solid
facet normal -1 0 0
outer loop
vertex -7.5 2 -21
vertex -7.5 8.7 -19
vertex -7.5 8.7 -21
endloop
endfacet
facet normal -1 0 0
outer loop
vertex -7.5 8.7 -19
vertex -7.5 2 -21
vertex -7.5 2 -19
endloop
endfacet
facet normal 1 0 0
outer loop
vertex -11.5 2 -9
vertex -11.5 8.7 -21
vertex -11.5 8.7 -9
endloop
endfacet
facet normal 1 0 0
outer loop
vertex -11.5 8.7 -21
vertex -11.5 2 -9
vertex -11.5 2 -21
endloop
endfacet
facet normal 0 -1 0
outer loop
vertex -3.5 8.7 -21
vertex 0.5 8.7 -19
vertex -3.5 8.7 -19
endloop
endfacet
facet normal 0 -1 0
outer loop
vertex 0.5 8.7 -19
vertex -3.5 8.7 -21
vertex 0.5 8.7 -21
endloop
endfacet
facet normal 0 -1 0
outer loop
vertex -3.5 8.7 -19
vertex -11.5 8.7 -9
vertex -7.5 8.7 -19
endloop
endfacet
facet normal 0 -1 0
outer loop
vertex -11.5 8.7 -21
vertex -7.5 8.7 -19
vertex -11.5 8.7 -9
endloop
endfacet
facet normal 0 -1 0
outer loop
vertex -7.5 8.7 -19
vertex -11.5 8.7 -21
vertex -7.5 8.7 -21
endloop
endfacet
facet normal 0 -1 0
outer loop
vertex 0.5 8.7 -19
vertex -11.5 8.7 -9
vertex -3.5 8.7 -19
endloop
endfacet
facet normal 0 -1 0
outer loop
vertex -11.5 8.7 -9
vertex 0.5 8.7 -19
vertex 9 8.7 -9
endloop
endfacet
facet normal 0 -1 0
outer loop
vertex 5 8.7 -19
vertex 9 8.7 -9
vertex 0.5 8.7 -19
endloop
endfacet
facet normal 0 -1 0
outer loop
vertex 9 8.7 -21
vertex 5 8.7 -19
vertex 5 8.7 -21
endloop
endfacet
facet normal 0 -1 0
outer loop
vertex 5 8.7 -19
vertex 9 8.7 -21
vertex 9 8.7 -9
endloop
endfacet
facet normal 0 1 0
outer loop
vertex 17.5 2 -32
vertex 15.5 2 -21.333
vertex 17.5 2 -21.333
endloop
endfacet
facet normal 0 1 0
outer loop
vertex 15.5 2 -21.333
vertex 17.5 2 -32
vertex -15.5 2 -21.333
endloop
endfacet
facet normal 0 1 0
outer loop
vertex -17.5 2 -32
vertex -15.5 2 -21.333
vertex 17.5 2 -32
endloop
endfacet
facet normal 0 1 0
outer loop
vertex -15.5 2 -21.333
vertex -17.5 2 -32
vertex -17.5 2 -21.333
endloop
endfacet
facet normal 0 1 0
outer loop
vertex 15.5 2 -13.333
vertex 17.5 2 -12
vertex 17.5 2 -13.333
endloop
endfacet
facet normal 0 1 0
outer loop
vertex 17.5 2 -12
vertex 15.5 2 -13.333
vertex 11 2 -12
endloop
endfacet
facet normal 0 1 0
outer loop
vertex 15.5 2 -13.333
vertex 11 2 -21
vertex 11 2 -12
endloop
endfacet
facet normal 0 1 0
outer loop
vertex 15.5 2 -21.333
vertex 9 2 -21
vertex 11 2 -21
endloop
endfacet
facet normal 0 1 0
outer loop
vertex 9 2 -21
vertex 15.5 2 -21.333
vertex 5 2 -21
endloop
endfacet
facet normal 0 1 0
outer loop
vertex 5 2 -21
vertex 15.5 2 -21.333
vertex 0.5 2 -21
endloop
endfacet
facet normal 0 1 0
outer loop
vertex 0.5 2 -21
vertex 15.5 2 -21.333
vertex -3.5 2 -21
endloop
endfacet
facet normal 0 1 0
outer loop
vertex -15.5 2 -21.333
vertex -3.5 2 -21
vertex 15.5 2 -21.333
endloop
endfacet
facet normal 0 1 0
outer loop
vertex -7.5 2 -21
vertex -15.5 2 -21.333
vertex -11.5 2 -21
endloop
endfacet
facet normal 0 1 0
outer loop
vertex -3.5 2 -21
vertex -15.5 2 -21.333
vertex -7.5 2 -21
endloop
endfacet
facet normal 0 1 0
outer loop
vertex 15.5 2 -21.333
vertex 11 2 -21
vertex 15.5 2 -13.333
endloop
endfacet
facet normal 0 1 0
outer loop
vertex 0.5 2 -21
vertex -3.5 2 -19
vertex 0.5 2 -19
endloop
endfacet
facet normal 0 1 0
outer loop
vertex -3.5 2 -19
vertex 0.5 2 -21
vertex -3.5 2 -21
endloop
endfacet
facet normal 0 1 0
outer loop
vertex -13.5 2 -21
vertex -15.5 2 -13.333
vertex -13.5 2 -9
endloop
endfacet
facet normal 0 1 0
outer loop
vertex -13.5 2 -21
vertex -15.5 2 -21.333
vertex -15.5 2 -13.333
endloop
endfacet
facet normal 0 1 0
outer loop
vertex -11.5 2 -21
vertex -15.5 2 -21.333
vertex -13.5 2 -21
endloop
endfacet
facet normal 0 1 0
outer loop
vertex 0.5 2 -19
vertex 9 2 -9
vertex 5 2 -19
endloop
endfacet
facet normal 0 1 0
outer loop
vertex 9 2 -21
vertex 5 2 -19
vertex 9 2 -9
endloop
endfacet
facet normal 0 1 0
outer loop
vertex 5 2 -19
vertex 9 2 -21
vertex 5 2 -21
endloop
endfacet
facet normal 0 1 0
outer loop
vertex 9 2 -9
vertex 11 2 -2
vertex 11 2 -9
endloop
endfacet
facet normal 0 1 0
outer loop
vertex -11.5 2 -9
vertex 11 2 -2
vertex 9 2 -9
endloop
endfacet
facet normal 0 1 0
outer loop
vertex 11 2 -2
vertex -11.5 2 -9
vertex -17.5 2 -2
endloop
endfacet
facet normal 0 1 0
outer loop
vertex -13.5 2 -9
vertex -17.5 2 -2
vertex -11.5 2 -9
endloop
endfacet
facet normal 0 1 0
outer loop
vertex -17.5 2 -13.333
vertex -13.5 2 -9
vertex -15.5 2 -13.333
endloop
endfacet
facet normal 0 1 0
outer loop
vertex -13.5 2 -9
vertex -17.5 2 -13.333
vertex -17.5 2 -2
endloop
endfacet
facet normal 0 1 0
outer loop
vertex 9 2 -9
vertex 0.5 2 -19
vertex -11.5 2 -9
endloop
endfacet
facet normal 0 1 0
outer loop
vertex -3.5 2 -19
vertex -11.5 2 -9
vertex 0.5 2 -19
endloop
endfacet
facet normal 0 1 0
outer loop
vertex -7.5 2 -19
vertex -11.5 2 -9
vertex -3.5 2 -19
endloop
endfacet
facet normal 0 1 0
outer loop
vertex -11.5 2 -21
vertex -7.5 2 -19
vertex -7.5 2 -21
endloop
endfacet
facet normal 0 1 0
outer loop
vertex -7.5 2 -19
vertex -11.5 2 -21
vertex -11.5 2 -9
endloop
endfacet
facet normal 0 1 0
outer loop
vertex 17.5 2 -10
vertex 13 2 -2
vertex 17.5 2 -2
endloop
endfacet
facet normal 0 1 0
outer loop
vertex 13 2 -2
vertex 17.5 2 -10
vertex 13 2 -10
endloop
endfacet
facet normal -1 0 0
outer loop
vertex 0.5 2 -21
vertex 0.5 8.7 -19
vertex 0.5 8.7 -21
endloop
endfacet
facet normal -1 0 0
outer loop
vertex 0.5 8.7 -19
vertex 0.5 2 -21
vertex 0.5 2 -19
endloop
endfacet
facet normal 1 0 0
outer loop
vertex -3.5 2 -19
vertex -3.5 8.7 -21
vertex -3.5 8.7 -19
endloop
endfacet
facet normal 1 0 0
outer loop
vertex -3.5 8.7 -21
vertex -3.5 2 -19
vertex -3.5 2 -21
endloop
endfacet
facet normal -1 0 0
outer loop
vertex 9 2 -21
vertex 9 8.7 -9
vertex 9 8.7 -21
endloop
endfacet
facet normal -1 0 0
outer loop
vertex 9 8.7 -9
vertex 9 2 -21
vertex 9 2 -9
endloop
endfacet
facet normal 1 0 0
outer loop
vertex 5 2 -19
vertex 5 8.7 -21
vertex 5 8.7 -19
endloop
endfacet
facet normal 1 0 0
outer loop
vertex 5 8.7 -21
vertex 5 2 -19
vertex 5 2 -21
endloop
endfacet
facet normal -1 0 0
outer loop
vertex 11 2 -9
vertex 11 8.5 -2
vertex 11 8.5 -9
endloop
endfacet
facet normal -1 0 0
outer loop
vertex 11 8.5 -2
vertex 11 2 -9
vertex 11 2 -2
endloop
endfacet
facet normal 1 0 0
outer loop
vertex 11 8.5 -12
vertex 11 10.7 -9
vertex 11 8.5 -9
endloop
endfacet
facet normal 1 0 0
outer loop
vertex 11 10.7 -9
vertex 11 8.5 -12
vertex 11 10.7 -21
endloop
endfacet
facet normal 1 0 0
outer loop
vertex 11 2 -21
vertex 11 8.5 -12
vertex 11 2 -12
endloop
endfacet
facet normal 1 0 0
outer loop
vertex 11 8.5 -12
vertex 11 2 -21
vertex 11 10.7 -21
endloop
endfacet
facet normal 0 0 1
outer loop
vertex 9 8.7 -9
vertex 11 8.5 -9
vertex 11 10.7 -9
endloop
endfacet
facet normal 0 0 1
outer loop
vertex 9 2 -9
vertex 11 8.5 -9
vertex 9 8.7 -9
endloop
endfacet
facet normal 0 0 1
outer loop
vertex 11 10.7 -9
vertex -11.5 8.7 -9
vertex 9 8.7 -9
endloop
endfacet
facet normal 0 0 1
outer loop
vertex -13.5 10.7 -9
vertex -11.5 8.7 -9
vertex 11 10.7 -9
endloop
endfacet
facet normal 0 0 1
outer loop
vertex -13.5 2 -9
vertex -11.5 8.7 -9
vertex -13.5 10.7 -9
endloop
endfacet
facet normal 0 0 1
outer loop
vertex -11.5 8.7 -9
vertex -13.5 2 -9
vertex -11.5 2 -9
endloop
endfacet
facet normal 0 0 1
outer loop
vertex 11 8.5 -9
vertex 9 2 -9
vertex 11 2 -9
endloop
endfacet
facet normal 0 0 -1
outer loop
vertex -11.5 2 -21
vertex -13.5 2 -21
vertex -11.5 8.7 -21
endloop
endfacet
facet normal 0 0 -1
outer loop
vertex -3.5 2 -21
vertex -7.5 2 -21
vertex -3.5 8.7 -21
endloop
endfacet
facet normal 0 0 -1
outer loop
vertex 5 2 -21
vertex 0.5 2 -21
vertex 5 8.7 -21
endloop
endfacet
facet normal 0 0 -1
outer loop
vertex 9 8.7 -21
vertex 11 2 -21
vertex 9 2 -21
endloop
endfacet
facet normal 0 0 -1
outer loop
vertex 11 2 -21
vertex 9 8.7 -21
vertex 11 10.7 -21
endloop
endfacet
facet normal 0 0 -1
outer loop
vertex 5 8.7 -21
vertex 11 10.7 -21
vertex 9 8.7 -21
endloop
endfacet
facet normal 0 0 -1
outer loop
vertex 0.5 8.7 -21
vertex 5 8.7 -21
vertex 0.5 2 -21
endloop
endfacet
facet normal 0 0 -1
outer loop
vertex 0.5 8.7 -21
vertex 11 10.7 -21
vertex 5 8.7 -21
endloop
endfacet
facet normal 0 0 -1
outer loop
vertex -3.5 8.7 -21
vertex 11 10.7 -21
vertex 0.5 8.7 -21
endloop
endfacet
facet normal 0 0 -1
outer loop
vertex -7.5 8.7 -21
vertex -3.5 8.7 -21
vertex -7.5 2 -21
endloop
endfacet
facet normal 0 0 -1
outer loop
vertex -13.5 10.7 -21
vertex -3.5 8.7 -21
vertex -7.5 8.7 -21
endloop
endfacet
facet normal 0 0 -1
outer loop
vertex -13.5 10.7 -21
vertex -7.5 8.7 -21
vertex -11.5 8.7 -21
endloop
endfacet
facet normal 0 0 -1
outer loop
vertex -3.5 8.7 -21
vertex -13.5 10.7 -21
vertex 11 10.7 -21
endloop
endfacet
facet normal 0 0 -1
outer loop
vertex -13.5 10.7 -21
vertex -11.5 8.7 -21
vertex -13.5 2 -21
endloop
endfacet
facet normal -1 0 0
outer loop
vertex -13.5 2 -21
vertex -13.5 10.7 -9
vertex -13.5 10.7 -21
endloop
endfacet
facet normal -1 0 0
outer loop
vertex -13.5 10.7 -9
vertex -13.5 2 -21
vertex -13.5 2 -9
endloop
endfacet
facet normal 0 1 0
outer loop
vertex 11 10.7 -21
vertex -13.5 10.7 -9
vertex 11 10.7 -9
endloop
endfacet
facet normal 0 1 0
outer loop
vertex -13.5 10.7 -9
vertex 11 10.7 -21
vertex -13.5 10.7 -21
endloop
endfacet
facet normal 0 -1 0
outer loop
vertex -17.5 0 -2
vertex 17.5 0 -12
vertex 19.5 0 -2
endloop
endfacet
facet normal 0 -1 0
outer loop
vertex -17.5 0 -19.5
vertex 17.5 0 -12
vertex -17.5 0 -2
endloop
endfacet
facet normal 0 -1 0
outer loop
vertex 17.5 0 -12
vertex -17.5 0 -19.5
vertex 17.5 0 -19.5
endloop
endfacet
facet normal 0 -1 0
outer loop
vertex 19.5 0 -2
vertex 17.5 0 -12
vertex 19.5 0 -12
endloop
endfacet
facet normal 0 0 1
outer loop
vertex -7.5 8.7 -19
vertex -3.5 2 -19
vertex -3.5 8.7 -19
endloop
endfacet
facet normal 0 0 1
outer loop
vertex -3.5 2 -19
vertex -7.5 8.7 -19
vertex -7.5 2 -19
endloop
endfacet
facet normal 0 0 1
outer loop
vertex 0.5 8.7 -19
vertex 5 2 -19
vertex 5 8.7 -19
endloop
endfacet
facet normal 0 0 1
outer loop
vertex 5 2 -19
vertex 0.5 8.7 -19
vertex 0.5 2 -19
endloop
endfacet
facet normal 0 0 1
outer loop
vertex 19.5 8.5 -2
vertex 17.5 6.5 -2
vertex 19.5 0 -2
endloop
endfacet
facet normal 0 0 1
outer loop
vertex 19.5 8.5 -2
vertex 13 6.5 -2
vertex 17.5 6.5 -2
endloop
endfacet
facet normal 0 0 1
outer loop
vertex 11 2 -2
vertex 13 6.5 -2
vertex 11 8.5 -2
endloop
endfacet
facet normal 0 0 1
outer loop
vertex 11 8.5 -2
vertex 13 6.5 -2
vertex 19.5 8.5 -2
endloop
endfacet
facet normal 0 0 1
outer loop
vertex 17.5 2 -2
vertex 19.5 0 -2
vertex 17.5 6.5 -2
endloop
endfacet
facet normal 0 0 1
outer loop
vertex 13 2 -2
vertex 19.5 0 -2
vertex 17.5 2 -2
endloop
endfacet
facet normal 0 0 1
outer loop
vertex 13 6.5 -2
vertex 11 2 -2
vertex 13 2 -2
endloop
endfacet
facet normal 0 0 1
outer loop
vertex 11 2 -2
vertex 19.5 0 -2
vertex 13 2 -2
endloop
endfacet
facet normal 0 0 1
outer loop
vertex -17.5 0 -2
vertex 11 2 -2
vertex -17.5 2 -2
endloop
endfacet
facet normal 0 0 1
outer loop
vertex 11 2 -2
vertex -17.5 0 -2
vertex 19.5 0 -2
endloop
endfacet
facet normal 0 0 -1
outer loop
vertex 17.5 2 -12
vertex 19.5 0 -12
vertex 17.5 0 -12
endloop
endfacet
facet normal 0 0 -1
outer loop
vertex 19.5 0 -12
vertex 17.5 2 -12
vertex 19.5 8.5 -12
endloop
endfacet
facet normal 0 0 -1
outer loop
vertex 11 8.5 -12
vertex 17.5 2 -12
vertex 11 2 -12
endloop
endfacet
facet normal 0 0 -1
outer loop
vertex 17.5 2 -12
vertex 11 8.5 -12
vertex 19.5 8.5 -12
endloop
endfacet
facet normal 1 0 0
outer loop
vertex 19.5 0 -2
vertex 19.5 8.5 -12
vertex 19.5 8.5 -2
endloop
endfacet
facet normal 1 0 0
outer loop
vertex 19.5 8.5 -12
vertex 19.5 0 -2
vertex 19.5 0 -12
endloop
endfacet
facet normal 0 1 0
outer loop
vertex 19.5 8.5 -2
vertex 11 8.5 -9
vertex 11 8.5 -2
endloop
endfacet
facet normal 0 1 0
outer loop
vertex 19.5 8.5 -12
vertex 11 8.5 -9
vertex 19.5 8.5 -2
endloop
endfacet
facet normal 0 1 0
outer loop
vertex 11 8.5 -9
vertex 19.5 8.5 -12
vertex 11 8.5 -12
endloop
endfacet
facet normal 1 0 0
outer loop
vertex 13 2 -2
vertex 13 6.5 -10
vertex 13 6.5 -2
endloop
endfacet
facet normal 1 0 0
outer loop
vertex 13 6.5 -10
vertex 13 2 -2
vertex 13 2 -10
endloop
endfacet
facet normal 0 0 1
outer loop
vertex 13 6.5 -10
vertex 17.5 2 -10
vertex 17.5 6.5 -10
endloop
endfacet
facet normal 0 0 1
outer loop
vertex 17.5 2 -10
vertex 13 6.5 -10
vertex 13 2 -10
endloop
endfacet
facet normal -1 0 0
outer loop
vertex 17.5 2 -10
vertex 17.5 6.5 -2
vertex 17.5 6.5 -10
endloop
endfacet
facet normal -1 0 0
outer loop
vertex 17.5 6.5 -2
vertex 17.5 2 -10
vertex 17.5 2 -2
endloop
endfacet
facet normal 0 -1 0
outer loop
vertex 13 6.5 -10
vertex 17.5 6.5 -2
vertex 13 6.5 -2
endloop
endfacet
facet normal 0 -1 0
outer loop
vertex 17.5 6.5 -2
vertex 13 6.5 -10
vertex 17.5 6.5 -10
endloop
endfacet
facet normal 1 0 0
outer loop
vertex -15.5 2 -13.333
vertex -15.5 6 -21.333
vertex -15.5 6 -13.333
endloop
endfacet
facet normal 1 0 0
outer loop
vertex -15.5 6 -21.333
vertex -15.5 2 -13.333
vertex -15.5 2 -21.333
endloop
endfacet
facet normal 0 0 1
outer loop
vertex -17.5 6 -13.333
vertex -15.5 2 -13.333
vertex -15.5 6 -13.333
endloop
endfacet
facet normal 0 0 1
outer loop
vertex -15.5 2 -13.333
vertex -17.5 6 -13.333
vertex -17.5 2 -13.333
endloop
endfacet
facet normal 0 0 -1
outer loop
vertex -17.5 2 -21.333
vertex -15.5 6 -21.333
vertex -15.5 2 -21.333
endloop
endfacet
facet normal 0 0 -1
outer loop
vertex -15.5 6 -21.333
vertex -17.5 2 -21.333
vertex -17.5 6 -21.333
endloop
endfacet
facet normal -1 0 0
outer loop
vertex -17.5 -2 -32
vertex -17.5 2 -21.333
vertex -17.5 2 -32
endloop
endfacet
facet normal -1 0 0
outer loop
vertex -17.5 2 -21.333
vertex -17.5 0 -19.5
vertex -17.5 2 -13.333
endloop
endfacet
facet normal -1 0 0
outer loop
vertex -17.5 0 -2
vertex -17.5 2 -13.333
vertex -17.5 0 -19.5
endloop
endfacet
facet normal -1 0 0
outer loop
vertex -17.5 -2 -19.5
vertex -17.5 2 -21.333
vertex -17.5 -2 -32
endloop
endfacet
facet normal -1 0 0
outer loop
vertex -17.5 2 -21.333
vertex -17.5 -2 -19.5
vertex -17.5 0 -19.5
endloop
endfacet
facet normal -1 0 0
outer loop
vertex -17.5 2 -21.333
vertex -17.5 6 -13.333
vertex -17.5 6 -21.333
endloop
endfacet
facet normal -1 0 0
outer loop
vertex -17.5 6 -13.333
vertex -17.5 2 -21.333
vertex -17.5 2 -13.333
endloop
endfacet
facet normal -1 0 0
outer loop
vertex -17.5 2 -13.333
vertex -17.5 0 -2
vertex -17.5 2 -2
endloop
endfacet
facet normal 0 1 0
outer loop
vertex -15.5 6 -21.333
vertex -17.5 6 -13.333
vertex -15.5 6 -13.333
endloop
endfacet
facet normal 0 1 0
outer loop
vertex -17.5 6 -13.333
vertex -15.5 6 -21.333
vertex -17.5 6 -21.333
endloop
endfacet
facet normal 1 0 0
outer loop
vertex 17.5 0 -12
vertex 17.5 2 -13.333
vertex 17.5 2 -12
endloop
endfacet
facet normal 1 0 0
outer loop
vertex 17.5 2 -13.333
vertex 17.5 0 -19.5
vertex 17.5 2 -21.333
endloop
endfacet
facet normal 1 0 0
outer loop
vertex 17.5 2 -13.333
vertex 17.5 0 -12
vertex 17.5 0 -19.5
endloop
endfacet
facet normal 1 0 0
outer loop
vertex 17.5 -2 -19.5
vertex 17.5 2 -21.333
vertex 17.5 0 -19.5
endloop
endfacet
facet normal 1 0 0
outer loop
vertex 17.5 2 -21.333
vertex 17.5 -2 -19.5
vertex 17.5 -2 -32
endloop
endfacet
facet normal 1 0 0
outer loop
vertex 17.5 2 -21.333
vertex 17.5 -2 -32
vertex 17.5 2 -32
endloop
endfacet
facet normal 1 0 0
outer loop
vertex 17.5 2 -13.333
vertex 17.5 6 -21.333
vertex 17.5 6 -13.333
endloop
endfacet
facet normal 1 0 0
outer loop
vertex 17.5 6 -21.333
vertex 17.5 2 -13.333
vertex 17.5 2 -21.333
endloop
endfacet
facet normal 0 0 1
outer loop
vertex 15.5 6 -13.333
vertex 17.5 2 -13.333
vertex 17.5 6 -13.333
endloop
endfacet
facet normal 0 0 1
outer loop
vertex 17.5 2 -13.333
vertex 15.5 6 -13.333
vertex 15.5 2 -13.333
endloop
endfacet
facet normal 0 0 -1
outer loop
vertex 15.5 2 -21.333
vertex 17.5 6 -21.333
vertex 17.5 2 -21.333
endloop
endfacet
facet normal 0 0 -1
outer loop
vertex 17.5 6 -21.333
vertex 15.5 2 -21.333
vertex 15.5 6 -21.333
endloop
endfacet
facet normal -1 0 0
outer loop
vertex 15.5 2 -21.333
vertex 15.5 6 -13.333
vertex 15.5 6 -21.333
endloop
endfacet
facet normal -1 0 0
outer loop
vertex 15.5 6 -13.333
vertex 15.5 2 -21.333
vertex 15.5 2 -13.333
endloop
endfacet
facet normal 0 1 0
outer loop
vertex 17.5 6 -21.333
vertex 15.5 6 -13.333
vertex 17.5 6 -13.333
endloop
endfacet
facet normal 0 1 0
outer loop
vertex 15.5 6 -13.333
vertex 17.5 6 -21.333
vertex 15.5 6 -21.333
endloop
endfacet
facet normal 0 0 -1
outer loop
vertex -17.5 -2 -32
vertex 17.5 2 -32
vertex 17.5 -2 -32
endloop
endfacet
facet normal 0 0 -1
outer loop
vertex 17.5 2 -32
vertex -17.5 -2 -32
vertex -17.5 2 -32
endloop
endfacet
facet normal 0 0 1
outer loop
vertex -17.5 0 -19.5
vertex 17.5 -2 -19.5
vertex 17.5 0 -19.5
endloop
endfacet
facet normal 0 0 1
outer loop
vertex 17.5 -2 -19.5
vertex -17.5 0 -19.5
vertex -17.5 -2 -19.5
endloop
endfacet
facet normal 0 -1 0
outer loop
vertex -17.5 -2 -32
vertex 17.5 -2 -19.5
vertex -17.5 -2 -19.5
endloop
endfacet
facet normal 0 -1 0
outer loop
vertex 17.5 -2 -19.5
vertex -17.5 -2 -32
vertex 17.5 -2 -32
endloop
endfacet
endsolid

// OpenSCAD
A=35;
    ST_U=19.5;
    ST_V=12.5;

B=ST_U+ST_V;
W=2;

SW_BOTTOM_Z=-17-2;    //  trigger dist is 17.1
SW_A=20+.5;
SW_D=6.5+.2;
SW_H=10+2;


S_D=4.5; //4.2 measured
S_L=10;  // compressed length


// switch lays on XY plane

module springCage() {
    
    
        translate([-W,-W,-W])
    difference() {
        cube([S_D+2*W,S_D+2*W,S_L]);
        translate([W,W,W])
        cube([S_D,S_D,S_L]);
    }
    
}

module switchCage() {
    difference() {
        translate([-W,-W,-W])
        cube([SW_A+2*W,SW_D+2*W,SW_H]);
        cube([SW_A,SW_D,SW_H]);
        for(x = [W,10,SW_A-W]) {
        translate([x,0,0])
            translate([-W,0,-50])
            cube([2*W,SW_D,100]);
        }
    }
}

module main() {
    
    SP=3*W;
    
    translate([-A/2+SP,W,SW_BOTTOM_Z])
    switchCage();
    
    translate([A/2,W,-S_L])
    mirror([1,0,0])
    springCage();
    
    translate([-A/2,0,-B])
    cube([A,W,B-W]);
    
    for(x=[-A/2,A/2-W]) 
        translate([x,0,-B*2/3])
        cube([W,3*W,8]);
    
    translate([-A/2,-W,-B]){
        cube([A,W,ST_V]);
    }
    
}
mode="r";
if(mode=="l") {
mirror([1,0,0])
main();
}

if(mode=="r") {
main();
}
